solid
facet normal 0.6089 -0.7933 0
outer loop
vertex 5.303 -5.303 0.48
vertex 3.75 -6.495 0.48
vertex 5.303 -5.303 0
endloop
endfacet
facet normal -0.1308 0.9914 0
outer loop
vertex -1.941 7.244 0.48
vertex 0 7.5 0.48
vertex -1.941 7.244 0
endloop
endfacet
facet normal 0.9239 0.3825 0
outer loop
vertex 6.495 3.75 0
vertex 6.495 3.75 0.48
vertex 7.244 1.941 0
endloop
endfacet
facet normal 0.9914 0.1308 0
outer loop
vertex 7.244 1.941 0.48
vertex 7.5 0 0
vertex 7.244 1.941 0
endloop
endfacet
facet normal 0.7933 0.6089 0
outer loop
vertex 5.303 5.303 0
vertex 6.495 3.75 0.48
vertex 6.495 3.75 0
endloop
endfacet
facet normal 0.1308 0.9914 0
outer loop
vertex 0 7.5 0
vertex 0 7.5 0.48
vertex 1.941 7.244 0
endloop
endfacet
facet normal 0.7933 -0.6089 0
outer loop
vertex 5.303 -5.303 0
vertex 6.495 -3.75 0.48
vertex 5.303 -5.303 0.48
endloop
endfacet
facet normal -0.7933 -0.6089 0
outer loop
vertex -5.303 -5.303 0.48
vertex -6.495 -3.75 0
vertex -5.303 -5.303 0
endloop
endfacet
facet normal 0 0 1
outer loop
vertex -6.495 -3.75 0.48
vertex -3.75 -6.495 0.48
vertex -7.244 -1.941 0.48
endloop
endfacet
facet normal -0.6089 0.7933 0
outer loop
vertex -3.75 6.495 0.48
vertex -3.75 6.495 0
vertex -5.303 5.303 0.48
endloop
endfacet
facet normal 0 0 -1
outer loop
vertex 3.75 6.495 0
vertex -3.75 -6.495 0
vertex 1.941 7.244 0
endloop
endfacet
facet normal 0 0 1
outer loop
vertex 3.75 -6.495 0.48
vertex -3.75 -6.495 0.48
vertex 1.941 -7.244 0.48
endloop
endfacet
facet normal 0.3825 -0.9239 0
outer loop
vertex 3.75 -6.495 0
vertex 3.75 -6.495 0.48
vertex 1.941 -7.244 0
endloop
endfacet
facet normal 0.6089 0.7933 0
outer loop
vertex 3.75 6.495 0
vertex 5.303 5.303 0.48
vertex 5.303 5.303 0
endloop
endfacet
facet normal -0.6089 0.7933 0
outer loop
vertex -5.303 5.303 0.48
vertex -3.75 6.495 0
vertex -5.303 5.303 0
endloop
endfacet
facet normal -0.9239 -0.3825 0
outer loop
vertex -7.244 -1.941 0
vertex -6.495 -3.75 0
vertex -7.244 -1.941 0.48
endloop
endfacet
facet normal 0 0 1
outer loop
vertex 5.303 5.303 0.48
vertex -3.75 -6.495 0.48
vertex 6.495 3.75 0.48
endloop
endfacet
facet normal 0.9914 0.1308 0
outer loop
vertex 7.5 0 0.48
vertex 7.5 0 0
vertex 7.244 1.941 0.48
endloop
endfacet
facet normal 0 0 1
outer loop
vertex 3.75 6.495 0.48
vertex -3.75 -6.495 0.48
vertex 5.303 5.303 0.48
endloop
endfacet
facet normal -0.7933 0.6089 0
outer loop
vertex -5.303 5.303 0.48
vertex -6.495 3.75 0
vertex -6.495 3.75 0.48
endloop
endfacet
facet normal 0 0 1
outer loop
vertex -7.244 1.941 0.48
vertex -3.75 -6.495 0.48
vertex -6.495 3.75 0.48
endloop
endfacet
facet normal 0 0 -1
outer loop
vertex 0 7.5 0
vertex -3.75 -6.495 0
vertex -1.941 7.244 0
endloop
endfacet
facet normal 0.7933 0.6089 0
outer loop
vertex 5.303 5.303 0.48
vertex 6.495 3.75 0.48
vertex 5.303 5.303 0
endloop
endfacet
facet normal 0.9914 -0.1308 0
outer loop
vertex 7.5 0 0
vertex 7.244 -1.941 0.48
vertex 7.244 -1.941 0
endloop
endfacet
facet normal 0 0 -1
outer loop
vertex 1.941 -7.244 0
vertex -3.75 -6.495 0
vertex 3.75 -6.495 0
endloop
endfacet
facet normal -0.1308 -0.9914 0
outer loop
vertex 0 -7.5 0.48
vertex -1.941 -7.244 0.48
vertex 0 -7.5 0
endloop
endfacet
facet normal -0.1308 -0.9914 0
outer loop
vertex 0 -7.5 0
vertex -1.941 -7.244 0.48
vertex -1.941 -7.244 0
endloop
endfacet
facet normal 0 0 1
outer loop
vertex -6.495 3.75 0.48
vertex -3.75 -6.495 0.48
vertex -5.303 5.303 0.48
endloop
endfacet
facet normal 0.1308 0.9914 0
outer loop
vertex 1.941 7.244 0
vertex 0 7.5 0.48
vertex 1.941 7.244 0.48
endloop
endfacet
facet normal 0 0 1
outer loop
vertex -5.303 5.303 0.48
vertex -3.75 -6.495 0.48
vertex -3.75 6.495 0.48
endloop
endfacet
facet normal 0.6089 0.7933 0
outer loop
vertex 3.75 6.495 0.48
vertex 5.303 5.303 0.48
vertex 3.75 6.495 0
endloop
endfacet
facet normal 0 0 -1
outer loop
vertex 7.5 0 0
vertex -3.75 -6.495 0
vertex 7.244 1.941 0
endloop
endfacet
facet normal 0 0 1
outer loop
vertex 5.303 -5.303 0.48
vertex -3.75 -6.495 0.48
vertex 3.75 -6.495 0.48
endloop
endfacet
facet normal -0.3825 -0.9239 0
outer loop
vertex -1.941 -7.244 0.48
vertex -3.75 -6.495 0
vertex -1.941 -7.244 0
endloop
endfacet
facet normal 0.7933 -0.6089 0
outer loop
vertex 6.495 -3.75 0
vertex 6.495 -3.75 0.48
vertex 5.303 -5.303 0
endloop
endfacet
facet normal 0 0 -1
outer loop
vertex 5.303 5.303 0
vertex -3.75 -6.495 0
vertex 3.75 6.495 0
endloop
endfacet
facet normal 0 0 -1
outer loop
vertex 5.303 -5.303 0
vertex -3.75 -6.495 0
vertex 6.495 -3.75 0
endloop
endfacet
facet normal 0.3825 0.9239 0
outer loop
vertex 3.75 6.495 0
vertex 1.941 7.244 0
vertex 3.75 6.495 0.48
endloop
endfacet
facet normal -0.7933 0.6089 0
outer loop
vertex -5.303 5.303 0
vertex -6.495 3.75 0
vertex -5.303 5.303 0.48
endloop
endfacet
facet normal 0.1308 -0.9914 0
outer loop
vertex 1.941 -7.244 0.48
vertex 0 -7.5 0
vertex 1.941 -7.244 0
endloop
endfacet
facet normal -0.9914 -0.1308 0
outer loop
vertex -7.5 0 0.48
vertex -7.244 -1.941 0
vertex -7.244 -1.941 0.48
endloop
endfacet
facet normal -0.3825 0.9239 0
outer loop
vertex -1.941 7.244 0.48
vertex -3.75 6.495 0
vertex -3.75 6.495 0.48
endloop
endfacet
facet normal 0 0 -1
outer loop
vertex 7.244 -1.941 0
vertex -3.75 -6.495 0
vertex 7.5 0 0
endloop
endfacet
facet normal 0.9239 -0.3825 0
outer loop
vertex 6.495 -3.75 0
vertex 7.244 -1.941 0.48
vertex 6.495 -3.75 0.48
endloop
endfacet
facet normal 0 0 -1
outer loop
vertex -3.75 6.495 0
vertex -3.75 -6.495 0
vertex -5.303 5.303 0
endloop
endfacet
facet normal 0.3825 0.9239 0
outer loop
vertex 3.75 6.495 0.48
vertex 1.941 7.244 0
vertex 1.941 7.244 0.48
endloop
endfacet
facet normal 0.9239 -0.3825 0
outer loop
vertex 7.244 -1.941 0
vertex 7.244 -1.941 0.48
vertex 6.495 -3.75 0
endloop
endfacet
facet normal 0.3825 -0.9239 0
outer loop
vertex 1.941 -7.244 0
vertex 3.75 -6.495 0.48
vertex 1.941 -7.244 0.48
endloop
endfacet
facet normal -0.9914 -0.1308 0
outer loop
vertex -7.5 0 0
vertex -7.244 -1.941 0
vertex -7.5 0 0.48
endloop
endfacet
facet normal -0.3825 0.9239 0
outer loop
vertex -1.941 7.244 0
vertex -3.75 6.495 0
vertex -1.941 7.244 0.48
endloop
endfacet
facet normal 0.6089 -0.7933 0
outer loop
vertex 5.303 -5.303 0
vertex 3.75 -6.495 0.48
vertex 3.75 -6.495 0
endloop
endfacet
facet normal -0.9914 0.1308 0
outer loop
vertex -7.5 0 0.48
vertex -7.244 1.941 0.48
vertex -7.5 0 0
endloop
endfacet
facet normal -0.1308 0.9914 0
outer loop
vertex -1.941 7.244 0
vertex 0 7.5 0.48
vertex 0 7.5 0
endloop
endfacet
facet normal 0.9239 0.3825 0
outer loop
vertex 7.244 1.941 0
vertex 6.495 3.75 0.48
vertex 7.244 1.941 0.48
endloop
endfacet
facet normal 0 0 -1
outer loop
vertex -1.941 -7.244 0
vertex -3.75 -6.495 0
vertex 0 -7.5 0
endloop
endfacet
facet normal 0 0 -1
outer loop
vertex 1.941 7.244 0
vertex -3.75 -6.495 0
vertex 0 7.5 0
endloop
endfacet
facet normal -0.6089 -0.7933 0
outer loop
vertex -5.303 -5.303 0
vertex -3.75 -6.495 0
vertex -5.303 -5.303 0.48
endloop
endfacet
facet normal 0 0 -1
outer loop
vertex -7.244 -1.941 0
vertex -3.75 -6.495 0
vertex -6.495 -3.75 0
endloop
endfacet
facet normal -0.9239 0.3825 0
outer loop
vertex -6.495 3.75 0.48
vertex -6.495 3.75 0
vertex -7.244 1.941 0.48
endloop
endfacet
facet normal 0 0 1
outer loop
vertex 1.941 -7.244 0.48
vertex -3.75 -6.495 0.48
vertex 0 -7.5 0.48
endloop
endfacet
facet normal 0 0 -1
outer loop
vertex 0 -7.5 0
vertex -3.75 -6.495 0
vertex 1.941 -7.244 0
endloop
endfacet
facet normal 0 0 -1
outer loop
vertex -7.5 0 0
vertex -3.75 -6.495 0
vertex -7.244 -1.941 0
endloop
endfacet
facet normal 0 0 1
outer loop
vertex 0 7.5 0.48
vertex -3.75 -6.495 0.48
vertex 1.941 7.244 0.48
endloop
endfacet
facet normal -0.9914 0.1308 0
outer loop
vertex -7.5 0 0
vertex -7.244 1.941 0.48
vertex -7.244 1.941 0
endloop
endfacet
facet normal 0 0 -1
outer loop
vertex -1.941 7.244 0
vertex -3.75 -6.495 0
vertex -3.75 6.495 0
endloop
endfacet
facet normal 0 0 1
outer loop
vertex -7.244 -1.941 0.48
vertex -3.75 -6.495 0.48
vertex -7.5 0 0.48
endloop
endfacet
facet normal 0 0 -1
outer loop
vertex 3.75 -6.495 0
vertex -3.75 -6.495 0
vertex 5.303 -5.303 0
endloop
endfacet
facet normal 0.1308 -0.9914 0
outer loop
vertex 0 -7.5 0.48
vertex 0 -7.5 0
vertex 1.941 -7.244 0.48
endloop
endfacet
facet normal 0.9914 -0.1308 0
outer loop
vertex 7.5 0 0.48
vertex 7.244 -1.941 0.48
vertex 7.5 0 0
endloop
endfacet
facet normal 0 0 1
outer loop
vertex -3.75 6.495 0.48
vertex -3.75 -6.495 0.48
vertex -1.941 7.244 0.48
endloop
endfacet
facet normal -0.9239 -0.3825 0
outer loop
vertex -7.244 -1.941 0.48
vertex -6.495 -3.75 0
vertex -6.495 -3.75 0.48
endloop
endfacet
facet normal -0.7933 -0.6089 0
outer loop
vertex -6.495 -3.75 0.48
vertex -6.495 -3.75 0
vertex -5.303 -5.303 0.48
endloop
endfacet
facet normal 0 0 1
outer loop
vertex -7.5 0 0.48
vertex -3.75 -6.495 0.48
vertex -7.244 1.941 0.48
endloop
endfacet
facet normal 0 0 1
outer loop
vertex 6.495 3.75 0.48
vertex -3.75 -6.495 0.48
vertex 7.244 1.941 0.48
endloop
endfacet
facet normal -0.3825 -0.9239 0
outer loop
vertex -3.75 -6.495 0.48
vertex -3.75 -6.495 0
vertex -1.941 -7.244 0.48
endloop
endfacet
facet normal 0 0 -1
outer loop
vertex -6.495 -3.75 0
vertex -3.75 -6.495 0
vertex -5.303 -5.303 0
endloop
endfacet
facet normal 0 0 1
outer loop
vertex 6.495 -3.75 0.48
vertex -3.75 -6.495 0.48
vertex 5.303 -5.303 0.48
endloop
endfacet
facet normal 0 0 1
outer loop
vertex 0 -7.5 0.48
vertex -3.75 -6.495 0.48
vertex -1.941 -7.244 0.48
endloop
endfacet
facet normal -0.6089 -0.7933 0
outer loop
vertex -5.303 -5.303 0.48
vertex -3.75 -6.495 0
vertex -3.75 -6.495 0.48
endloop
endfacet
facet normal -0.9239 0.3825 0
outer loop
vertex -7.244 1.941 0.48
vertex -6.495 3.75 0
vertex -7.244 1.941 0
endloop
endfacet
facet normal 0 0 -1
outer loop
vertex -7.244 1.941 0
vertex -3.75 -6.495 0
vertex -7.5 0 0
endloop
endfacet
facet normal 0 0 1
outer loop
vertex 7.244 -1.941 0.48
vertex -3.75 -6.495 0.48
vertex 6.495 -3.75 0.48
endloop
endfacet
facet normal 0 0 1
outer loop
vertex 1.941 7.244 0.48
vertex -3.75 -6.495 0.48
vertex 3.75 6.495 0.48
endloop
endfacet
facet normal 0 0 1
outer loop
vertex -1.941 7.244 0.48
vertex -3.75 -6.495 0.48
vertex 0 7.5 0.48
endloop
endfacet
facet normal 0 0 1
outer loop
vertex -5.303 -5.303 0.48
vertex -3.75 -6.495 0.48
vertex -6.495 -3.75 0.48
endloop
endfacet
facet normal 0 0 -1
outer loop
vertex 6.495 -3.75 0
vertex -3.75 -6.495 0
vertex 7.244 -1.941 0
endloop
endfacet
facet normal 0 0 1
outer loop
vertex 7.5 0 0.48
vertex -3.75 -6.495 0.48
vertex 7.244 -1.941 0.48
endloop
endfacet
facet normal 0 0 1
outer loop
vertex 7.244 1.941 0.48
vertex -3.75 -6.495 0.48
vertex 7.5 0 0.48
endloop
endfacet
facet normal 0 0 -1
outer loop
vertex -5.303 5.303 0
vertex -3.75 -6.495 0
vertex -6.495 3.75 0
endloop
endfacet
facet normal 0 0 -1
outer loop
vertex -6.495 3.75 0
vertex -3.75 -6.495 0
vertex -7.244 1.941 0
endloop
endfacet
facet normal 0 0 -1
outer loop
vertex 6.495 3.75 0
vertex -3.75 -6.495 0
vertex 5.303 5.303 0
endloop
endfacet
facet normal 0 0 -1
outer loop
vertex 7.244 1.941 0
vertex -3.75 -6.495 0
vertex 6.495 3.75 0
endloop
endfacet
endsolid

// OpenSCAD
//////////////////////////////////////////
//    Anti-warping_Disks.scad created   //
//   by J.Rodrigo ( www.jrodrigo.net )  //
//      Under licence (CC) BY-SA        //
//////////////////////////////////////////

// First Layer Height
LayerHeight = 0.24 ; // mm

// Number of layers with anti-warping
NoLayers    = 2 ;    // mm

// Diameter of anti-warping circumference
Diameter    = 15  ;  // mm

// Length (for make an oval)(0 to disable)
Length = 0 ;   // mm

color("DodgerBlue"){
    hull(){
        translate([-Length/2,0,0])
        cylinder(h=LayerHeight*NoLayers,r=Diameter/2);
        translate([Length/2,0,0])
        cylinder(h=LayerHeight*NoLayers,r=Diameter/2);
    }
}
